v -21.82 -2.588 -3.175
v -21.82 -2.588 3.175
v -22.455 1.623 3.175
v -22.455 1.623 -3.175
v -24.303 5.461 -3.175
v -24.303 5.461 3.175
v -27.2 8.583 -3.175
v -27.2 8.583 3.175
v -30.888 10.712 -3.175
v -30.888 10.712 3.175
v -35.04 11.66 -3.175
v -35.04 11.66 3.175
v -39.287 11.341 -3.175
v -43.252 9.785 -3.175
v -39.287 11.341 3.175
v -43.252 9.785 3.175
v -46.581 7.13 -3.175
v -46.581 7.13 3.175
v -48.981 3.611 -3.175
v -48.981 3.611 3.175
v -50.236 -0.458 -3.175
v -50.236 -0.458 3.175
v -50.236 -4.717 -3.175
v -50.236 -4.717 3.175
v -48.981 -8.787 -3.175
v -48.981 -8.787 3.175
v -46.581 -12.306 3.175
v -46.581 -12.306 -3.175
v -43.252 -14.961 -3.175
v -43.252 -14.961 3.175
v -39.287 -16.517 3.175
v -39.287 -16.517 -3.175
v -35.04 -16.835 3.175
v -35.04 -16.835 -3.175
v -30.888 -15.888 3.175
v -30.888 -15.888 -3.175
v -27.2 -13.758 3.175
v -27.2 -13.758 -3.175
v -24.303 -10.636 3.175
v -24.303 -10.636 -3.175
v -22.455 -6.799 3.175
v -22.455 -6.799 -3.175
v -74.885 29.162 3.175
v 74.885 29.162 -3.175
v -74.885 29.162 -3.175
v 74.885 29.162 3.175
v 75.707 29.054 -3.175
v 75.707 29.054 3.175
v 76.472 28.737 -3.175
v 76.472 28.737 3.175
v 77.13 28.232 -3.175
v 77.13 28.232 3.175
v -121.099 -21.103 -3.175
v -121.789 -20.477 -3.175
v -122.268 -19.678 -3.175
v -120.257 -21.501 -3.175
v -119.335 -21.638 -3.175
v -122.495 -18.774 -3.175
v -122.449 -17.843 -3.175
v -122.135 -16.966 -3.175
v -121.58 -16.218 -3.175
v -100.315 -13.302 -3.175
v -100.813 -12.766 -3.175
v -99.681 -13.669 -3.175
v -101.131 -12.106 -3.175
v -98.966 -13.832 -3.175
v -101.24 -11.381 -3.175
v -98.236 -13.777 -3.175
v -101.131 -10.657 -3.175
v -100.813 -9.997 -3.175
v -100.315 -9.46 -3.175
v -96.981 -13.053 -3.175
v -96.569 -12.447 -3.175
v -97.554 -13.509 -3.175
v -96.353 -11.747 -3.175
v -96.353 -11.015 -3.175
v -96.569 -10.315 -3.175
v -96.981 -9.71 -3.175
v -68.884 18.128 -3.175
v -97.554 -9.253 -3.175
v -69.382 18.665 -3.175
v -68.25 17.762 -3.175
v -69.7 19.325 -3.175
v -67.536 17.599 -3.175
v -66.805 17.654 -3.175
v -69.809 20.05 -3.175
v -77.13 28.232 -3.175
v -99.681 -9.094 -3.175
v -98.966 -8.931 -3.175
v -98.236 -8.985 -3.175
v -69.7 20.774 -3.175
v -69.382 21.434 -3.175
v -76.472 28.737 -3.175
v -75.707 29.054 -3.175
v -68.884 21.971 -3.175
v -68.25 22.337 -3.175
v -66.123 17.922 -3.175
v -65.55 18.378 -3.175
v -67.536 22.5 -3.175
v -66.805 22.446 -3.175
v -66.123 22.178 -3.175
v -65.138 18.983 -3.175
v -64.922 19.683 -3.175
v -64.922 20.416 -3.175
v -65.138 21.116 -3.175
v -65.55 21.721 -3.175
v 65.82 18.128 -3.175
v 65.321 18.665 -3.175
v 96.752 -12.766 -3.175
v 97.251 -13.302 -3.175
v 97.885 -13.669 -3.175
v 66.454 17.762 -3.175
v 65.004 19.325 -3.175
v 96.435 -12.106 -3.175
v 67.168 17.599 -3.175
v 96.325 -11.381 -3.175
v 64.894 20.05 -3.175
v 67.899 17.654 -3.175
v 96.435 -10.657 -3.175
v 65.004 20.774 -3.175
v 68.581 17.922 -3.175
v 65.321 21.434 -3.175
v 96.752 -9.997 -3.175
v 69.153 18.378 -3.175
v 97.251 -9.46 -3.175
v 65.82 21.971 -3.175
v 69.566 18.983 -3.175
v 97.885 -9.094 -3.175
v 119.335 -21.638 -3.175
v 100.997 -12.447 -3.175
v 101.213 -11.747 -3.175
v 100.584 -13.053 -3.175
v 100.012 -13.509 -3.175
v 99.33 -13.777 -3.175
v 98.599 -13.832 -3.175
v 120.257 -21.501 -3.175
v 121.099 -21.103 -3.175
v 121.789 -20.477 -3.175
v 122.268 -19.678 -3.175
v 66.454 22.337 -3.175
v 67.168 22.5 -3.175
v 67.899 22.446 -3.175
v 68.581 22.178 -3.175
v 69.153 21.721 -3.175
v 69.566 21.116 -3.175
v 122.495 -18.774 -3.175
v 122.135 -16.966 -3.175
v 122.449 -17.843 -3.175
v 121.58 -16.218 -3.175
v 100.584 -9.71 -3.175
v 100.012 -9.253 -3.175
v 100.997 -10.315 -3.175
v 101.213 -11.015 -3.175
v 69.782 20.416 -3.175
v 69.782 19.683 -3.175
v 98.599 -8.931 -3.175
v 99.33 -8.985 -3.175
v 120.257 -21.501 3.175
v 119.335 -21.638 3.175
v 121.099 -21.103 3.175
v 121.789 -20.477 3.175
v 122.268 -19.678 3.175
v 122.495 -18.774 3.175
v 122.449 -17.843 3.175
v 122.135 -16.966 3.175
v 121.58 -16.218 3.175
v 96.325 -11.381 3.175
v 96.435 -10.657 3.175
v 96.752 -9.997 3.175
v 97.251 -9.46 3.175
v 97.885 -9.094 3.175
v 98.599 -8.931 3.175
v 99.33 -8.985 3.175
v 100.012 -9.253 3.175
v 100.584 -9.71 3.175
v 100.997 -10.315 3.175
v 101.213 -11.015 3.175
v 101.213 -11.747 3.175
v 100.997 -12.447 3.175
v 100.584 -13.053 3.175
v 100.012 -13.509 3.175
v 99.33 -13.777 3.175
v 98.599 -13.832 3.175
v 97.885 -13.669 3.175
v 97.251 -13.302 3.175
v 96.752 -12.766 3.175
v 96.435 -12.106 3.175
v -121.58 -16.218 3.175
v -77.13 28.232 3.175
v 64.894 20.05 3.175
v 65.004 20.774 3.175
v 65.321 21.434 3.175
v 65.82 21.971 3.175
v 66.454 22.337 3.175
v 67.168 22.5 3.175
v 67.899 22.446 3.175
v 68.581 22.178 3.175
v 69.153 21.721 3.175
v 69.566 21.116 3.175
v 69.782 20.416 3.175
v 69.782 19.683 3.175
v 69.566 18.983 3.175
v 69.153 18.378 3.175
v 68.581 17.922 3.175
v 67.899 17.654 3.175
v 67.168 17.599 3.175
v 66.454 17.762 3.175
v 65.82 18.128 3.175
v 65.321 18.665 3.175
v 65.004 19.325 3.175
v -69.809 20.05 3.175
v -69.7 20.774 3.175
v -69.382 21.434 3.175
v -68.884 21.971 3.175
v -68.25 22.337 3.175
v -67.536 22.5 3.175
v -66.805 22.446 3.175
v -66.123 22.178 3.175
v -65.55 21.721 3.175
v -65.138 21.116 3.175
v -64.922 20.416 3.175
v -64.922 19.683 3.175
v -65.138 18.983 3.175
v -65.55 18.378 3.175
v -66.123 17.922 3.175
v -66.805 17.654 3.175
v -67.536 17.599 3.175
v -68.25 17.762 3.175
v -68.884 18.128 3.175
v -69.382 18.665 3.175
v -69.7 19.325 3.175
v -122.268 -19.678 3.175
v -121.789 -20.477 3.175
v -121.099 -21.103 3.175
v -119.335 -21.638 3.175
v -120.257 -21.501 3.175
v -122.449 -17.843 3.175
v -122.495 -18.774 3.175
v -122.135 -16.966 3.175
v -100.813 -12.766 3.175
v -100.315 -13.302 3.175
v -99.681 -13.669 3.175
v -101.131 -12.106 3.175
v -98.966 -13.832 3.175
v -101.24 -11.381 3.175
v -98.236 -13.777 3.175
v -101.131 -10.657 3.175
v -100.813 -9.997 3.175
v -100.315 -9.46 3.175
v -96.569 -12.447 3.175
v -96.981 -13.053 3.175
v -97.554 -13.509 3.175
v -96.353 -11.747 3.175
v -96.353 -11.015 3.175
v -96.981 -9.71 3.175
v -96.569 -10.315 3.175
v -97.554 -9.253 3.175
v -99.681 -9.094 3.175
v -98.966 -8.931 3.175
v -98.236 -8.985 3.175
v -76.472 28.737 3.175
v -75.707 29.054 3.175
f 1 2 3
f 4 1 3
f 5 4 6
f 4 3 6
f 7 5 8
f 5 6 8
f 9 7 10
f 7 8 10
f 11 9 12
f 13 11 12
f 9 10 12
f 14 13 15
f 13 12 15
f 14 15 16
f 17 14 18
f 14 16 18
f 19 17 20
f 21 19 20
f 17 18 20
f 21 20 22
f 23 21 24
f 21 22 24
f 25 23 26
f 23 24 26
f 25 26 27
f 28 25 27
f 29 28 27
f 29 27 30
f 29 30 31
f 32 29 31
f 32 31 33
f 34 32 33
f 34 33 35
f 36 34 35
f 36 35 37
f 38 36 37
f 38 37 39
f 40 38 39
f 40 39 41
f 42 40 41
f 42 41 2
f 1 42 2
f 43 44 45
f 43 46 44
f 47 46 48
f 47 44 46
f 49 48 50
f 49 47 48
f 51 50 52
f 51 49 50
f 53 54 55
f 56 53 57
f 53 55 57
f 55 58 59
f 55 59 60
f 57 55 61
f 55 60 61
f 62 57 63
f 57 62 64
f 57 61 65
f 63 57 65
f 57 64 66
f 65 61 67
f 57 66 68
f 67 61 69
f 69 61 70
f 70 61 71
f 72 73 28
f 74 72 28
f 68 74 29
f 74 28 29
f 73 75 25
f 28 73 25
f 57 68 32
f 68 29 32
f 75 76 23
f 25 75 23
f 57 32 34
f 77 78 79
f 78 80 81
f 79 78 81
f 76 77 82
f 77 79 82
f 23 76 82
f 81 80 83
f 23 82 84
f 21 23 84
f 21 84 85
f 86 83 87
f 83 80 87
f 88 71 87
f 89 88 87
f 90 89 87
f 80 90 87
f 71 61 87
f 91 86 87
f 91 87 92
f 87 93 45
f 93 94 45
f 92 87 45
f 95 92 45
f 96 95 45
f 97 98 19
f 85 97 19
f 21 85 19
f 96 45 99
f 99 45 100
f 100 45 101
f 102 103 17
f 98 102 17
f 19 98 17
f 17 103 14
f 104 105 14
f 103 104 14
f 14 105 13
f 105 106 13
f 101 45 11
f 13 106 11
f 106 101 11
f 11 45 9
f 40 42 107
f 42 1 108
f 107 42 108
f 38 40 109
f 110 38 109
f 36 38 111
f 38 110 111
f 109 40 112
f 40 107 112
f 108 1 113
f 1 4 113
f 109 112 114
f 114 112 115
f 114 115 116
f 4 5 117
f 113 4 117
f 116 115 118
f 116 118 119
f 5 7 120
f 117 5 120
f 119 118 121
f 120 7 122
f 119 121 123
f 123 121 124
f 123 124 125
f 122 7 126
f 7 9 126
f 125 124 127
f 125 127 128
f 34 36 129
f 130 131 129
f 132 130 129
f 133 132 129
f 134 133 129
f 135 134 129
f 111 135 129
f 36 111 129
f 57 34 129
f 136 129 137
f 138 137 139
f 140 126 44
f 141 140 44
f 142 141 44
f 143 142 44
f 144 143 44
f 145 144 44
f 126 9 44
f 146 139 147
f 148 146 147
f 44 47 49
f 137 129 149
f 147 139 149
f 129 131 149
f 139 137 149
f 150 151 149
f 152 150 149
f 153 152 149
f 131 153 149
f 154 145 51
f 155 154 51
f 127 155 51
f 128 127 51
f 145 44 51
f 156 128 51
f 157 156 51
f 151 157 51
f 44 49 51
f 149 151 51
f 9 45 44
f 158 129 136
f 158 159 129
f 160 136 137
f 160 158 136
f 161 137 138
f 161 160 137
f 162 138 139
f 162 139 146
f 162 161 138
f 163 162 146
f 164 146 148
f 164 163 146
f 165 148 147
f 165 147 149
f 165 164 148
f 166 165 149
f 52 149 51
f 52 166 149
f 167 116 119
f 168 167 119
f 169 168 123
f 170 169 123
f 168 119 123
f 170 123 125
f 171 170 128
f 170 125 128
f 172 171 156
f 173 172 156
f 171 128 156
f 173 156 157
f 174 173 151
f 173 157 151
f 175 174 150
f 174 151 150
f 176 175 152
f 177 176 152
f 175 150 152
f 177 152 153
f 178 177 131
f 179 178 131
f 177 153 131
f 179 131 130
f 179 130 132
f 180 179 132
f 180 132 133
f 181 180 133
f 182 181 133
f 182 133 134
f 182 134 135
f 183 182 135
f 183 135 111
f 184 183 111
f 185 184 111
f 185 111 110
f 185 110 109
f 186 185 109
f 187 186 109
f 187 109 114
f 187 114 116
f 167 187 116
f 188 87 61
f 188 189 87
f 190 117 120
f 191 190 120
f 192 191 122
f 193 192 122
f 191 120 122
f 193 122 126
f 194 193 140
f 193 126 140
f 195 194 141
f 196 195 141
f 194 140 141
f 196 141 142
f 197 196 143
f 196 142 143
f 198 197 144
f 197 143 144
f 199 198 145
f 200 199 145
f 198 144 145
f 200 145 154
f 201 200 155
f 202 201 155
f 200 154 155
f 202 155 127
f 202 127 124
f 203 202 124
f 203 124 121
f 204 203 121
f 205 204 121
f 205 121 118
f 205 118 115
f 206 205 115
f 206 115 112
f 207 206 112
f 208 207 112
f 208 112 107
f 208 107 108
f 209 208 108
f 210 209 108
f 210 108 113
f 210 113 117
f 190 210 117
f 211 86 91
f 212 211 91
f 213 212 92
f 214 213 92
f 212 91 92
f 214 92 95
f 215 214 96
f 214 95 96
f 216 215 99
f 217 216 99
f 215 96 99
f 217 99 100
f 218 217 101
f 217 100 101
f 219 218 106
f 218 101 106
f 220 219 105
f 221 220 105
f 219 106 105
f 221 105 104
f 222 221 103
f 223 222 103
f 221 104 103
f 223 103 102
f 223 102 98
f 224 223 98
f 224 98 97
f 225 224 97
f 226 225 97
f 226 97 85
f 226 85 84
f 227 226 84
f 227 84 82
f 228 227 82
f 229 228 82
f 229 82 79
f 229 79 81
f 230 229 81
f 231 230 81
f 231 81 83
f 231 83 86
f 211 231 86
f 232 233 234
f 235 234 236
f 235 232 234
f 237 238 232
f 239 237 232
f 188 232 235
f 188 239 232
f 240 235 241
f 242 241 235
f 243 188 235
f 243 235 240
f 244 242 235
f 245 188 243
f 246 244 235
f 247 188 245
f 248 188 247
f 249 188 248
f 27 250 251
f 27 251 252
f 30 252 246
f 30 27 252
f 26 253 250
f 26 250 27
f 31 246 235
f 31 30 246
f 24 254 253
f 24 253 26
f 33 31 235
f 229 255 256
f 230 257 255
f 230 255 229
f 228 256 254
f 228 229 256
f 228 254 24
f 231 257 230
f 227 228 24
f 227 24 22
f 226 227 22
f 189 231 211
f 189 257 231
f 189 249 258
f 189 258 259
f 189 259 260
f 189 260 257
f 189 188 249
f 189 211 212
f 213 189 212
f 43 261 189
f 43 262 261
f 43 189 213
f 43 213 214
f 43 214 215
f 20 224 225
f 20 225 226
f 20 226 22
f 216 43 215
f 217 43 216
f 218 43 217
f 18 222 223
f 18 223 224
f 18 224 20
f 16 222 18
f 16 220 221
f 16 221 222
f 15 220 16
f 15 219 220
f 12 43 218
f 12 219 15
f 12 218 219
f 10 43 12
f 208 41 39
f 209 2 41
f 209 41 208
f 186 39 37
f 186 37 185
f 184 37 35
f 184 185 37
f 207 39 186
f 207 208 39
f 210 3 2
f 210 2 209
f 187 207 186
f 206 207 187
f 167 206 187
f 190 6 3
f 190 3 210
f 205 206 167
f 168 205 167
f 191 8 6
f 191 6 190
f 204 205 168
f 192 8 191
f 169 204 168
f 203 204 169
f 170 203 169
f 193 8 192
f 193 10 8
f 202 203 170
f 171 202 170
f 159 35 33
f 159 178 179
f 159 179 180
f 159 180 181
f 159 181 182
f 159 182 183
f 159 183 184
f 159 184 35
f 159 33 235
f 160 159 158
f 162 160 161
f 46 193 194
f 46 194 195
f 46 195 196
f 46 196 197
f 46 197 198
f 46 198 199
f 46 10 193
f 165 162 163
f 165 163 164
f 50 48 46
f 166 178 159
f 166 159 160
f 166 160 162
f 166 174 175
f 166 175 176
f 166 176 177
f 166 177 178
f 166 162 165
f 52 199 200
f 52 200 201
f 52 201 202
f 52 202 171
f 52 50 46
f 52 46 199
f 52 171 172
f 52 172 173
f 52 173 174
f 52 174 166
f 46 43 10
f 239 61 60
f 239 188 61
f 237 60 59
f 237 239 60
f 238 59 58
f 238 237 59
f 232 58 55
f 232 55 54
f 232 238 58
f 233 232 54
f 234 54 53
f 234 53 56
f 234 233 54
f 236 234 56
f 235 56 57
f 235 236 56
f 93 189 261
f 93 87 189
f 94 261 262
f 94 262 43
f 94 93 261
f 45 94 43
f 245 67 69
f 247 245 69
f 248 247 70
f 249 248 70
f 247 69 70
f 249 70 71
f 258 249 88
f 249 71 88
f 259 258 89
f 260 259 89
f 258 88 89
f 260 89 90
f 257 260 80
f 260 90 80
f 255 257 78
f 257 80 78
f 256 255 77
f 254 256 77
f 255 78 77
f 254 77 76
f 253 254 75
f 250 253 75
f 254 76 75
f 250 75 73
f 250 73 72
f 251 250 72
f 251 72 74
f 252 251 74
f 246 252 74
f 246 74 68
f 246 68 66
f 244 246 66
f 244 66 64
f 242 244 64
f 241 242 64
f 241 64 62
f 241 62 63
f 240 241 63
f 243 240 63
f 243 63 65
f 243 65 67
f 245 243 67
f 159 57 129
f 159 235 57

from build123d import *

# Parameters (mm, degrees)
BOSS_EXTRUDE1_DEPTH          = 3.175
SKETCH2_R                    = 14.2875
CUT_EXTRUDE1_DEPTH           = 131.459778054
F_10_0_1935_DIAMETER_HOLE2_D = 4.9149
FILLET1_R                    = 3.175


with BuildPart() as part:
    # Sketch1 → Boss-Extrude1 (new, symmetric)
    with BuildSketch(Plane.XY):
        Polygon((-76.2, 29.162153383), (-127, -21.637846617), (127, -21.637846617), (76.2, 29.162153383), align=None)
    extrude(amount=BOSS_EXTRUDE1_DEPTH, both=True)

    # Sketch2 → Cut-Extrude1 (cut, through all)
    with BuildSketch(Plane.XY.offset(3.175)):
        with Locations((-36.107951031, -2.587846617)):
            Circle(SKETCH2_R)
    extrude(amount=-CUT_EXTRUDE1_DEPTH, mode=Mode.SUBTRACT)

    # #10 (0.1935) Diameter Hole2 (through all)
    with Locations(Plane(origin=(67.351920908, 20.049720233, 3.175), x_dir=(1, 0, 0), z_dir=(0, 0, 1))):
        with Locations((0, 0), (31.430896424, -31.430896424), (-134.703841816, 0), (-166.13473824, -31.430896424)):
            Hole(F_10_0_1935_DIAMETER_HOLE2_D / 2)

    # Fillet1
    fillet1_edges = [part.edges().sort_by_distance(p)[0] for p in [
        (76.2, 29.162153383, 0),
        (127, -21.637846617, 0),
        (-127, -21.637846617, 0),
        (-76.2, 29.162153383, 0),
    ]]
    fillet(fillet1_edges, radius=FILLET1_R)


solid = part.part
